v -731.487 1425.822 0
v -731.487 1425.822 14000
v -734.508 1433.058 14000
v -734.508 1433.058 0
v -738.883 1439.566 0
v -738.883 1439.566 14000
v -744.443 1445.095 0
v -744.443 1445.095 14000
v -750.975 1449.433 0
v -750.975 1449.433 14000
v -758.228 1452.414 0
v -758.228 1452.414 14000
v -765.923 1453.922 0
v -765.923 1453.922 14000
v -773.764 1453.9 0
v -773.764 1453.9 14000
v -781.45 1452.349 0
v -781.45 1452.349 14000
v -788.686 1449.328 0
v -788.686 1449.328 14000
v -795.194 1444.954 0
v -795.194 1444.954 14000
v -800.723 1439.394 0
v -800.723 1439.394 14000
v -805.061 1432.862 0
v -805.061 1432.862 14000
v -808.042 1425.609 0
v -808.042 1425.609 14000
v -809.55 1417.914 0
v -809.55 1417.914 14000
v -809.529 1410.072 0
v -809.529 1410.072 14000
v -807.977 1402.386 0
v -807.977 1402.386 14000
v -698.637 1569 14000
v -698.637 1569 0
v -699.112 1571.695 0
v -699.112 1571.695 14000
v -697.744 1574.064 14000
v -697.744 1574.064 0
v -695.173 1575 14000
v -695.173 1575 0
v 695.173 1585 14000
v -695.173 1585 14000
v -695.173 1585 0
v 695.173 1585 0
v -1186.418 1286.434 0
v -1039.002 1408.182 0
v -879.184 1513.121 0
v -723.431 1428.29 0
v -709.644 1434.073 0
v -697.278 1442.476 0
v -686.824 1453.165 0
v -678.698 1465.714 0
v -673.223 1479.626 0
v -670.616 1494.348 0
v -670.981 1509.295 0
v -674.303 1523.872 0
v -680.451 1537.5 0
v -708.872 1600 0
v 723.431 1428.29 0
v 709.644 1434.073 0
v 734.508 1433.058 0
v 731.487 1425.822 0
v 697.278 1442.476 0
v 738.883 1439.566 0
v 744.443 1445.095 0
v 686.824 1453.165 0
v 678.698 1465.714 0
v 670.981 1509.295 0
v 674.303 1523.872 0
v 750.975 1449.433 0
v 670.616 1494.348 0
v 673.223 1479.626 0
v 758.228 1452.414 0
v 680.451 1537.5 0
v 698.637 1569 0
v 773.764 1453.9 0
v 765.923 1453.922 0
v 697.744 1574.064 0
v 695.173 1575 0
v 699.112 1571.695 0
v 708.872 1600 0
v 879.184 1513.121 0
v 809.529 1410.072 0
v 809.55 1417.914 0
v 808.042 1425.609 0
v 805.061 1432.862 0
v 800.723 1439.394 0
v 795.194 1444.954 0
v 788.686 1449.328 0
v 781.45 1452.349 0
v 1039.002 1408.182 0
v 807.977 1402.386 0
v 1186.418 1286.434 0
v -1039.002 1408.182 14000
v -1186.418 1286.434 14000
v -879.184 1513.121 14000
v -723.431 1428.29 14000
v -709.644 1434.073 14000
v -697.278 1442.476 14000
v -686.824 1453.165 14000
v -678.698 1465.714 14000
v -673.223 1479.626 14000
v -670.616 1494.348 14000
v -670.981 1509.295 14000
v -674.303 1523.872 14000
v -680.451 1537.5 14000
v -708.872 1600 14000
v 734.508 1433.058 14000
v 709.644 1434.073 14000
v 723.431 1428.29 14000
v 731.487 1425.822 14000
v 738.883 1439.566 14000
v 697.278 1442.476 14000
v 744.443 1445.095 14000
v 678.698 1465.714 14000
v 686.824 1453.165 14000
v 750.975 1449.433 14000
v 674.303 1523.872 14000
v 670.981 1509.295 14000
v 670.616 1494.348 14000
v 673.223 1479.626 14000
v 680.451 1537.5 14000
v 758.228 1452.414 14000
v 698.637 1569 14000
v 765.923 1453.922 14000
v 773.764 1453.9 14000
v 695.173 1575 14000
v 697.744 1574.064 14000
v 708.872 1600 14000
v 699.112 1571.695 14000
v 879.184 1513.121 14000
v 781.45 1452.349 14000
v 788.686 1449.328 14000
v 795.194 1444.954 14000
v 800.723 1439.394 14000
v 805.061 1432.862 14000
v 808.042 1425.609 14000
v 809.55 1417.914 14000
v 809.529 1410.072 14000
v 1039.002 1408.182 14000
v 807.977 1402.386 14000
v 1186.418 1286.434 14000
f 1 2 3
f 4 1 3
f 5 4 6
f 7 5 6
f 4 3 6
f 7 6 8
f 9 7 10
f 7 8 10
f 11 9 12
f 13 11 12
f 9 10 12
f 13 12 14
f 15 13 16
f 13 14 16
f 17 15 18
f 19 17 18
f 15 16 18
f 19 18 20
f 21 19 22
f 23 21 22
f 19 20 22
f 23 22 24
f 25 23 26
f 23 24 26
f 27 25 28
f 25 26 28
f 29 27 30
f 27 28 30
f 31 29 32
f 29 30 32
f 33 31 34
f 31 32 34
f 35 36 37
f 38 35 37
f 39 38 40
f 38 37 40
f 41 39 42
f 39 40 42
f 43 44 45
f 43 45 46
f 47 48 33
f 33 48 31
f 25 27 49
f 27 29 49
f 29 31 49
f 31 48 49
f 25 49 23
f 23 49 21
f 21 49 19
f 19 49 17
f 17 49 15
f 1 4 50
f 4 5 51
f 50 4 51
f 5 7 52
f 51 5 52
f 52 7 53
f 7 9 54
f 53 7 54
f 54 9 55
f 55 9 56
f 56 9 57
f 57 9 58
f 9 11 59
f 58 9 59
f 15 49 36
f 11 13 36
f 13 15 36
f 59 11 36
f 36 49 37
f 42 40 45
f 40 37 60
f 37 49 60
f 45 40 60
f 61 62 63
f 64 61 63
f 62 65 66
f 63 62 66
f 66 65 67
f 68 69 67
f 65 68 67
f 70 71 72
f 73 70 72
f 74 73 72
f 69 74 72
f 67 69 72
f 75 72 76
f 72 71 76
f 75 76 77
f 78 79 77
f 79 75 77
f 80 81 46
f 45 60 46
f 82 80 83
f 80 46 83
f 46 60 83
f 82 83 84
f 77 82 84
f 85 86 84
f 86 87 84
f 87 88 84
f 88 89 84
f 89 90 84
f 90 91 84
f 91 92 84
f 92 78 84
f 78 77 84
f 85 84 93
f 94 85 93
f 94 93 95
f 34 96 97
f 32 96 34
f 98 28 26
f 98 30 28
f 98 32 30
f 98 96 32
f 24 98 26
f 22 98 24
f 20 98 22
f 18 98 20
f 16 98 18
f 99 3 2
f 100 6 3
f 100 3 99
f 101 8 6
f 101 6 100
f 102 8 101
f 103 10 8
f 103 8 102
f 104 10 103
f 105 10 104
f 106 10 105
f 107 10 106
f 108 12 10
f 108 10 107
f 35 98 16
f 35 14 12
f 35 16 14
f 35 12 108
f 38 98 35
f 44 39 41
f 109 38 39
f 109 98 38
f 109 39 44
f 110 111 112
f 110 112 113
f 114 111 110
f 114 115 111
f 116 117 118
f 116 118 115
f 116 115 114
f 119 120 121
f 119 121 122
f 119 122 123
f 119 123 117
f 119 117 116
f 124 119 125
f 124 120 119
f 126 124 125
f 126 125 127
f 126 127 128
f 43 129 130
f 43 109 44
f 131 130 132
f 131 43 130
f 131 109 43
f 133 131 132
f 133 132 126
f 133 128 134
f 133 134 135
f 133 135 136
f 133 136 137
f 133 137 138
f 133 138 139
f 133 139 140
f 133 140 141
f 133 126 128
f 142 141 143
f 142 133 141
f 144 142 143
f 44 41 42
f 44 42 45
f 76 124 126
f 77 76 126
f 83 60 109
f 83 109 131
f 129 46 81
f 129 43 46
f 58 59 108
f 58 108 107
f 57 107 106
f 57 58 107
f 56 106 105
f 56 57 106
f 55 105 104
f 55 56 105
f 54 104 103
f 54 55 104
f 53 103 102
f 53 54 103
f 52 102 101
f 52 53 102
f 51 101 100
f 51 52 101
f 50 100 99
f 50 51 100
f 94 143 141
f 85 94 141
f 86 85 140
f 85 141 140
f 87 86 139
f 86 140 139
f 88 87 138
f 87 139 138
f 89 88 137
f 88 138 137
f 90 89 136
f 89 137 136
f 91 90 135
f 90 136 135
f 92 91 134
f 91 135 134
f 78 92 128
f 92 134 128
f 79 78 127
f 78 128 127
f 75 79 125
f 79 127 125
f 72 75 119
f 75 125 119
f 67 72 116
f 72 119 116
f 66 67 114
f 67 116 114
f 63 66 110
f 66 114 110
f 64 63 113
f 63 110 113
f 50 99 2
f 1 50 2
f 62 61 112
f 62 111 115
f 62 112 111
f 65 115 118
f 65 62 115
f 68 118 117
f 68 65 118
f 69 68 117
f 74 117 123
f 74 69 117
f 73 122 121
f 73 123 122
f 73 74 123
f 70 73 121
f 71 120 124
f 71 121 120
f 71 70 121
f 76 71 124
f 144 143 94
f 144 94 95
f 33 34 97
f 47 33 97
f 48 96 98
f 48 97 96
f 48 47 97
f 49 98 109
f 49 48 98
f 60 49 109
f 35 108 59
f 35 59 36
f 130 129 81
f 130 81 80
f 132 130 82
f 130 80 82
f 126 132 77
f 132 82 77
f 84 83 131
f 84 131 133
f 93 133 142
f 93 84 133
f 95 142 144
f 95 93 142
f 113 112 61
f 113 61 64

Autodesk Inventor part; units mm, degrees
ref_plane "YZ Plane" through (0, 0, 0) normal (1, 0, 0) x (0, 1, 0)
ref_plane "XZ Plane" through (0, 0, 0) normal (0, 1, 0) x (-1, 0, 0)
ref_plane "XY Plane" through (0, 0, 0) normal (0, 0, 1) x (1, 0, 0)
sketch "Sketch1" plane through (0, 0, 0) normal (0, 0, 1) x (1, 0, 0)
  circle A0 centre (0, 0) radius 1750
  line L0 (-708.8723, 1600) -> (708.8723, 1600)
  line L1 (-695.1731, 1575) -> (695.1731, 1575)
  circle A1 centre (-745.4026, 1500) radius 75
  circle A2 centre (745.4026, 1500) radius 75
  line L2 (-723.4312, 1428.2905) -> (-1186.4179, 1286.4341)
  line L3 (723.4312, 1428.2905) -> (1186.4179, 1286.4341)
  line L4 (680.4507, 1537.5) -> (698.6372, 1569)
  line L5 (-680.4507, 1537.5) -> (-698.6372, 1569)
  arc A3 (-695.1731, 1575) -> (-698.6372, 1569) centre (-695.1731, 1571) ccw
  arc A4 (698.6372, 1569) -> (695.1731, 1575) centre (695.1731, 1571) ccw
  point P0 (-762.8073, 1575)
  point P1 (762.8073, 1575)
  dimension "d0" = 3500
  dimension "d1" = 1600
  dimension "d2" = 25
  dimension "d3" = 150
  dimension "d4" = 60
  dimension "d5" = 4
extrude "Extrusion1" add sketch "Sketch1" along normal blind 14000 contours L3 A2 A0 | A0 A1 L2 | A2 L4 A4 L1 A3 L5 A1 A0 L0 | A2 | A1
sketch "Sketch2" plane through (0, 0, 14000) normal (0, 0, 1) x (1, 0, 0)
  line L0 (695.1731, 1575) -> (-695.1731, 1575)
  line L1 (-695.1731, 1575) -> (-695.1731, 1585)
  line L2 (-695.1731, 1585) -> (695.1731, 1585)
  line L3 (695.1731, 1585) -> (695.1731, 1575)
  point P0 (0, 0)
  dimension "d8" = 10
extrude "Extrusion2" cut sketch "Sketch2" against normal through all
sketch "Sketch3" plane through (0, 0, 14000) normal (0, 0, 1) x (1, 0, 0)
  circle A0 centre (-769.7322, 1414.1041) radius 40
  circle A1 centre (769.7322, 1414.1041) radius 40
  line L0 (-1186.4179, 1286.4341) -> (-723.4312, 1428.2905) projected
  line L1 (723.4312, 1428.2905) -> (1186.4179, 1286.4341) projected
  point P0 (0, 0)
  point P1 (731.4871, 1425.8222)
  point P2 (807.9773, 1402.386)
  point P3 (-807.9773, 1402.386)
  point P4 (-731.4871, 1425.8222)
  dimension "d11" = 80
extrude "Extrusion3" cut sketch "Sketch3" against normal through all contours L0 A0 | A1 L1 picked at (-778.7621, 1440.6353) picked at (777.2707, 1435.424)
properties part number "CeilingPanel"
